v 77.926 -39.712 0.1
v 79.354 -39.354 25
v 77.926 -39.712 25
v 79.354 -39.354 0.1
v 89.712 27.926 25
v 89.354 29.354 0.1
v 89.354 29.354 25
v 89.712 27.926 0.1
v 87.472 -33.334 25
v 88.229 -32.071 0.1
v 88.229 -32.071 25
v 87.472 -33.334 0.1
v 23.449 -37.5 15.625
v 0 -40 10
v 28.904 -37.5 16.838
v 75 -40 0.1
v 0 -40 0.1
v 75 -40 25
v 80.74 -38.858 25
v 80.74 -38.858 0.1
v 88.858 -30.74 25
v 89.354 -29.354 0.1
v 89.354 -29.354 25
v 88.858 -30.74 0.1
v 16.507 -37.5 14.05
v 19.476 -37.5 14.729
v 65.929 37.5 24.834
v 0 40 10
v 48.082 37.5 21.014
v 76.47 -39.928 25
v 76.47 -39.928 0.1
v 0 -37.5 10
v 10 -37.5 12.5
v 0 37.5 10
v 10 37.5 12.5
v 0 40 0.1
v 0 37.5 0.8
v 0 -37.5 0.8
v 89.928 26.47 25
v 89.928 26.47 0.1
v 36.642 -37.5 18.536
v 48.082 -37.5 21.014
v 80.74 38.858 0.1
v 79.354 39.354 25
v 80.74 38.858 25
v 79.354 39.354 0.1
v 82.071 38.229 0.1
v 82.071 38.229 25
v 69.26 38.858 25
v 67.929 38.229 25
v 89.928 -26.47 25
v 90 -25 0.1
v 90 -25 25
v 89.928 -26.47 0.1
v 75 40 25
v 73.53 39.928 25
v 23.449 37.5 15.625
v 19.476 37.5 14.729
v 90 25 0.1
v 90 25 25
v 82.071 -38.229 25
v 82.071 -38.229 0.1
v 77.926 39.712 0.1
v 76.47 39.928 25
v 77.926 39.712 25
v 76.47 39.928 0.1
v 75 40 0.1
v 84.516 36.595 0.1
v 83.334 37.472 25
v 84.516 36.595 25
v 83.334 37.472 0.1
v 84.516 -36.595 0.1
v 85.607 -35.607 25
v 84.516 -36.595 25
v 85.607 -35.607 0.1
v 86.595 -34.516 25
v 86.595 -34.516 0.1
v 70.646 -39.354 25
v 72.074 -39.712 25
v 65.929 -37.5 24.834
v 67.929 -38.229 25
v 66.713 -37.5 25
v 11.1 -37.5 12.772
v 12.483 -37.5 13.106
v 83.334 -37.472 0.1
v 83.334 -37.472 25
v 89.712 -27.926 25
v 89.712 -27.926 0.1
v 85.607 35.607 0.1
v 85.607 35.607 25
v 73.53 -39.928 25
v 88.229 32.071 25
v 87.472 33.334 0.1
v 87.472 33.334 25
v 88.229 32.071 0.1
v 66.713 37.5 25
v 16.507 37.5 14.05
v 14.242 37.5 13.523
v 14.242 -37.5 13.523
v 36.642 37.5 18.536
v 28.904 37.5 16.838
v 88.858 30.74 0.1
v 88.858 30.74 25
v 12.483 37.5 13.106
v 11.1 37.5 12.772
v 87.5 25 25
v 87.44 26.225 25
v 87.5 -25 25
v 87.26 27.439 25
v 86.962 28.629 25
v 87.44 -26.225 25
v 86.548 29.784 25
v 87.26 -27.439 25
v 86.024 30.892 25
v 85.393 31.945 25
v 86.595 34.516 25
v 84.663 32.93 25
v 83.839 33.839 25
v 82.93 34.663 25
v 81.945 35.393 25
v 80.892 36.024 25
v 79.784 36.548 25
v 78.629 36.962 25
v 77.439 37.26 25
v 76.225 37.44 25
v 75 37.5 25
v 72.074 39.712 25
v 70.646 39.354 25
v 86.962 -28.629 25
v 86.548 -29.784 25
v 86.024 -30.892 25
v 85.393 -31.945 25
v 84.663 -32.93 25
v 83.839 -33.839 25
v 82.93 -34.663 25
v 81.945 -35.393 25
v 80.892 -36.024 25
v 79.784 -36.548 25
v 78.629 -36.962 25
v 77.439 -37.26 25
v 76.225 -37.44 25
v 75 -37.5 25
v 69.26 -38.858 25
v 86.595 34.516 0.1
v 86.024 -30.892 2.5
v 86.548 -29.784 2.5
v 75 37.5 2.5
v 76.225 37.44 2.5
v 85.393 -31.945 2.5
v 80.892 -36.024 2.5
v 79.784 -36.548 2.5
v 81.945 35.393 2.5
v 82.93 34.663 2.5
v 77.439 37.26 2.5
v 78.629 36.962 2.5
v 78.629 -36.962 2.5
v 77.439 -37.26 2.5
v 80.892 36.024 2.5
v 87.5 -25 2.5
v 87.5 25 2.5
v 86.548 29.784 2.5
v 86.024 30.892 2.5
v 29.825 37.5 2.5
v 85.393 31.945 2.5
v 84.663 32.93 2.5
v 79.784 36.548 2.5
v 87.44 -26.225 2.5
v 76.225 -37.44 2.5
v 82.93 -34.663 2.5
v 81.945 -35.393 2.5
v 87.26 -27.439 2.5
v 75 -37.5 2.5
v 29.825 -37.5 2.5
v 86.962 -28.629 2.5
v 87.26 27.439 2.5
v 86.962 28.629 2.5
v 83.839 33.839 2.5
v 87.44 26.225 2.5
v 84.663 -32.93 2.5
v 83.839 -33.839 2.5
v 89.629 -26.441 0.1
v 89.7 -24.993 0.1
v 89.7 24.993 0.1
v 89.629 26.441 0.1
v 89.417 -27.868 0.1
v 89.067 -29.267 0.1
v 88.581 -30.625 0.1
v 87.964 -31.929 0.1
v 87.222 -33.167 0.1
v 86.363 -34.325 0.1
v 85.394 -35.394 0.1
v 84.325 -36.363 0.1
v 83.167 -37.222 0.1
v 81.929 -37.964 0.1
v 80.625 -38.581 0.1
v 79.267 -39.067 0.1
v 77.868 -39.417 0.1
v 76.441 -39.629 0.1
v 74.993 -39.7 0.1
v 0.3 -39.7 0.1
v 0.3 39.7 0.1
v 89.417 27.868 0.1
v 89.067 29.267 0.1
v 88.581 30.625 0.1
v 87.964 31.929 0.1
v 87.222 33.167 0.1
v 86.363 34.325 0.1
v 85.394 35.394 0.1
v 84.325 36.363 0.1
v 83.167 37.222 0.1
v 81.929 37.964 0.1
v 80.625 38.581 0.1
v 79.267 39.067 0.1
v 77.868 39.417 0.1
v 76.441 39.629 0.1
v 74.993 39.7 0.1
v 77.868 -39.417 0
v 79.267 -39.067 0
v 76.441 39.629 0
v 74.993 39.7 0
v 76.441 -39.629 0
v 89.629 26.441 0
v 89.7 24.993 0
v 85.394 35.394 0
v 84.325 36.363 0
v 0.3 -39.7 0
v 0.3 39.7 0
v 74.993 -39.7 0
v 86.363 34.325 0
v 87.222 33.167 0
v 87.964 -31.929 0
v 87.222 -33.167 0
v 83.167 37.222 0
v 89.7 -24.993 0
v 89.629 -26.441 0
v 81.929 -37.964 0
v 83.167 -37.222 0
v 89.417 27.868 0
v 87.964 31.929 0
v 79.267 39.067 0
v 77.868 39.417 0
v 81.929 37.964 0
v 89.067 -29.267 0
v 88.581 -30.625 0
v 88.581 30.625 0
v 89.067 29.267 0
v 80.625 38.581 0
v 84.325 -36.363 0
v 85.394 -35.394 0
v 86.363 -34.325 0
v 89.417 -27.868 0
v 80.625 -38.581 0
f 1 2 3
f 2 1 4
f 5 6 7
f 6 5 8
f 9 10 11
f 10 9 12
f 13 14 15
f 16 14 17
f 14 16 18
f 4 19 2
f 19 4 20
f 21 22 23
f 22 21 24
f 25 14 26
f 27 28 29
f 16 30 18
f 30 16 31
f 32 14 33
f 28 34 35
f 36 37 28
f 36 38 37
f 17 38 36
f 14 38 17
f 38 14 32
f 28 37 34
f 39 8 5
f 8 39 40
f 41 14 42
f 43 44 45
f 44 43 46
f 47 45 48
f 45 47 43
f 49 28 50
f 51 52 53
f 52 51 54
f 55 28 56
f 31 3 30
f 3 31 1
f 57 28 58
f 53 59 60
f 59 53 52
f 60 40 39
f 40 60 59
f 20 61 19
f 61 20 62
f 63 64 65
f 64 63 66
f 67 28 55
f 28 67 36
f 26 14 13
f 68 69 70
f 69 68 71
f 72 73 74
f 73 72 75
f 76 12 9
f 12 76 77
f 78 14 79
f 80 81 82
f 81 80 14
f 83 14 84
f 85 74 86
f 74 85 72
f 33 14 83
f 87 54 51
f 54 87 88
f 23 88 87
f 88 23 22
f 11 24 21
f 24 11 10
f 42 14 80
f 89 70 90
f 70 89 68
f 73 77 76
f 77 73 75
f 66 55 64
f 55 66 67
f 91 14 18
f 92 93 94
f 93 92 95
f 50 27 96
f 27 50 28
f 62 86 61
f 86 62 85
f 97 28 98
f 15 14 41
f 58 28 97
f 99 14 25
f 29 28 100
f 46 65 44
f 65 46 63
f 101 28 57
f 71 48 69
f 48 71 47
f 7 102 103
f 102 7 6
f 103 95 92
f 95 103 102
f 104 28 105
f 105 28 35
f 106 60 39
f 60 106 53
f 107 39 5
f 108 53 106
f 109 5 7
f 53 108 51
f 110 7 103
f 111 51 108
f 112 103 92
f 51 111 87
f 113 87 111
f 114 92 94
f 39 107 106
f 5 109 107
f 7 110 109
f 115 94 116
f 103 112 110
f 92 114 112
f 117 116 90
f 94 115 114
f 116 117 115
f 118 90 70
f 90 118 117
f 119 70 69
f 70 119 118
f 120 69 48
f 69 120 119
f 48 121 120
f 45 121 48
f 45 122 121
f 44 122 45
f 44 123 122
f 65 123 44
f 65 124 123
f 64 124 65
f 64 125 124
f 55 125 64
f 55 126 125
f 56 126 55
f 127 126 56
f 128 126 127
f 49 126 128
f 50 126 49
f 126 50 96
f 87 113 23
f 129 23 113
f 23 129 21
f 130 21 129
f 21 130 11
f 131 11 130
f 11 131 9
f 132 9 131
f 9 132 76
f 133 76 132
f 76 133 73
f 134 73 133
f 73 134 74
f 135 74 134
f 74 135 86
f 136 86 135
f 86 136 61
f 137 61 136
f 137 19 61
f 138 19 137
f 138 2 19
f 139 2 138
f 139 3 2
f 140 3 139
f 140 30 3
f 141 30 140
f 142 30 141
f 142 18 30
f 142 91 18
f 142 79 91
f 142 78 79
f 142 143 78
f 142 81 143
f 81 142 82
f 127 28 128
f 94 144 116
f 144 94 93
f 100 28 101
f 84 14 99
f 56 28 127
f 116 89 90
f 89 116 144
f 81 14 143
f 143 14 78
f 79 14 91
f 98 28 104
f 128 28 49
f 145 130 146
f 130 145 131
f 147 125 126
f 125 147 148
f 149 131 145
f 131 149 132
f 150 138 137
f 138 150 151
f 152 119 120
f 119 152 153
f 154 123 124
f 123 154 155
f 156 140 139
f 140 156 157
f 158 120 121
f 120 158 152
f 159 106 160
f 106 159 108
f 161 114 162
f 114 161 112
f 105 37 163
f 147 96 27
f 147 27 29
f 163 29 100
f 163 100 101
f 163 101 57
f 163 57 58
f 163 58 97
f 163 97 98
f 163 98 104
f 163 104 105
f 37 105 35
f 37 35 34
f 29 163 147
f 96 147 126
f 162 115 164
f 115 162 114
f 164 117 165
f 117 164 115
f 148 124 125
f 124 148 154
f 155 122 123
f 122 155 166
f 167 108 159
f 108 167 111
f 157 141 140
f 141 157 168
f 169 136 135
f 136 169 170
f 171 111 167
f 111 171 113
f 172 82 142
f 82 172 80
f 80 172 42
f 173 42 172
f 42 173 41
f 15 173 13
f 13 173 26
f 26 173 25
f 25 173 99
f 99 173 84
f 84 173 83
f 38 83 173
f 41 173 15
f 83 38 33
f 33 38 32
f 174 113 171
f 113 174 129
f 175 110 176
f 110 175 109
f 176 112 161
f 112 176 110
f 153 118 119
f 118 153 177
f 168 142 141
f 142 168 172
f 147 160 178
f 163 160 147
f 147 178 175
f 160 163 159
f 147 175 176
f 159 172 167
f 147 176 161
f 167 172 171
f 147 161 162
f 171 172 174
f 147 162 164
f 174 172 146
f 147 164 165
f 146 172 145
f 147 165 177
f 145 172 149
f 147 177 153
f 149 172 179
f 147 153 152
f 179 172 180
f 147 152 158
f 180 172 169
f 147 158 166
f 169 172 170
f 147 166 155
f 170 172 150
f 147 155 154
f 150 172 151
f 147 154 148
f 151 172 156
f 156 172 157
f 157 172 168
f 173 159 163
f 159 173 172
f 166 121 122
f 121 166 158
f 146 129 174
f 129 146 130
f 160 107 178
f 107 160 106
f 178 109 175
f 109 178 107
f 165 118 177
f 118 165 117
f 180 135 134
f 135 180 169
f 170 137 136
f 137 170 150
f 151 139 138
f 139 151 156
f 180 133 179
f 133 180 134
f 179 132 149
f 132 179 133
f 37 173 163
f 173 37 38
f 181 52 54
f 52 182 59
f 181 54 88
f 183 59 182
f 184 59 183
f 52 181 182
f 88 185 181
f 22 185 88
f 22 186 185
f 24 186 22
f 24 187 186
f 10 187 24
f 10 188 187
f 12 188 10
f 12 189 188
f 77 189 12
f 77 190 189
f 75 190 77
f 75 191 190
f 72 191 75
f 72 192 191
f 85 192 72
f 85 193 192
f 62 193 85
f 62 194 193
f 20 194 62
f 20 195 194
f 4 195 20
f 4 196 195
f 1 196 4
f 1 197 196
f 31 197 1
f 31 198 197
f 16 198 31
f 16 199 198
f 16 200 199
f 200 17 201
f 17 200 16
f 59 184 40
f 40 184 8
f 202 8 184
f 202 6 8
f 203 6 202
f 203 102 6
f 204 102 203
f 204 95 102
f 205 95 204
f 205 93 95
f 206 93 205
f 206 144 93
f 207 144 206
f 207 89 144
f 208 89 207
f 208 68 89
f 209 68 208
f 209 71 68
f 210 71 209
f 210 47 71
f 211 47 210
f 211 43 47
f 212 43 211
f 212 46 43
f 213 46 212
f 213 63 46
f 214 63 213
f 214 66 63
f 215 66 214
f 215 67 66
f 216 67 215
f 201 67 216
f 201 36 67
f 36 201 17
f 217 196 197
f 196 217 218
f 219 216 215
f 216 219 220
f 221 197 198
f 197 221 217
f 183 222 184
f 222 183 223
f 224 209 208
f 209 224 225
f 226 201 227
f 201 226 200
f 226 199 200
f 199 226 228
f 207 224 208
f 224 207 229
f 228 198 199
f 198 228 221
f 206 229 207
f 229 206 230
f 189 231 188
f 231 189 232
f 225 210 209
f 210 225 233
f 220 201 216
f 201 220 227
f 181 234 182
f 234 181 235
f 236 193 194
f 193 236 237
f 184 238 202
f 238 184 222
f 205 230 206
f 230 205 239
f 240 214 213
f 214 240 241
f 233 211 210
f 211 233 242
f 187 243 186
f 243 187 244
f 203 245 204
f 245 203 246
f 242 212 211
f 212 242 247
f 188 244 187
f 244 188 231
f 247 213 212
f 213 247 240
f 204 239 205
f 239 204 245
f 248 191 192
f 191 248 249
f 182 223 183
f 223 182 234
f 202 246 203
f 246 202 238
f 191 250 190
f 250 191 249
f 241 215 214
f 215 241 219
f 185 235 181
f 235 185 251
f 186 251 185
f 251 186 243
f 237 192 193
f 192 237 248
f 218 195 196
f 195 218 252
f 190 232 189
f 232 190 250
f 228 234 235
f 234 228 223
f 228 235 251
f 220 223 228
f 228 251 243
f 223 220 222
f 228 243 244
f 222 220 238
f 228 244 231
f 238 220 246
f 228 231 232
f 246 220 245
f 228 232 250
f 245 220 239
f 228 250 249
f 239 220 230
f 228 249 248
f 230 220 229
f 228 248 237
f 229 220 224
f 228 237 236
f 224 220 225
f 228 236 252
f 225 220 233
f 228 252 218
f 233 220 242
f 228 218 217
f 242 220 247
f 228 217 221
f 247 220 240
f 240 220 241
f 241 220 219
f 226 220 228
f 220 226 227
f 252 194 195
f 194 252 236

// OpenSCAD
$fn=64;

// Width at the opening, includes wall thickness.
width = 80;
// Length including wall thickness.
length = 90;
// Wall height at the closed end
height = 25;
// Wall height at the open end.
front_height = 10;
// Radius of the two corners at the closed end.
corner_radius=15;
// Wall thickness
wall_thickness = 2.5;
// Base thickness
base_thickness = 2.5;
// Reduced base thickness at the open end.
slope_height = 0.8;
// Length of base slope at the open end.
slope_length = 30;
// Inset first layer by this dimension (0 to disable). Helps prevnting
// 'elephant foot' syndrom.
first_layer_inset_width = 0.3;
// Height of first layer. Ignored if first_layer_inset_width is zero or negative.
first_layer_inset_height = 0.2;

eps1 = 0.01 + 0;  // hide on thingiverse customizer.
eps2 = 2*eps1;

// Operator to inset first layer to eliminate elephant foot.
// Children are assumed to be on the z=0 plane.
module inset_first_layer(w=0.4, h=0.2, eps=0.01) {
  if (w == 0 || h < 0) {
    children();
  } else {
    difference() {
      children();  
      // TODO: use actual extended children projection instead
      // of a clube with arbitrary large x,y values.
      cube([200, 200, h], center=true);
    }
    linear_extrude(height=h+eps) 
      offset(r = -w) 
        projection(cut=true) 
          children();  
  }
}

module block() {
  hull() {
    translate([length-corner_radius, width/2-corner_radius, 0]) 
        cylinder(r=corner_radius, h=height);
    translate([length-corner_radius, -(width/2-corner_radius), 0]) 
        cylinder(r=corner_radius, h=height);
    
    translate([0, -width/2, 0]) cube([eps1, width, front_height]);
  }
}

module hollow() {
  w = width - 2*wall_thickness;
  l = length - wall_thickness;
  r = corner_radius - wall_thickness;
  
  hull() {
    translate([l-r, w/2-r, base_thickness]) 
        cylinder(r=r, h=height);
    translate([l-r, -(w/2-r), base_thickness]) 
        cylinder(r=r, h=height);
    translate([-eps1, -w/2, base_thickness]) cube([eps1, w, height]);
  }
}

module slope() {
  w = width - 2*wall_thickness;
  hull() {
    translate([-eps1, -w/2, slope_height]) 
        cube([eps1, w, height]);
    translate([slope_length-eps1, -w/2, base_thickness+eps1]) 
        cube([eps1, w, height]);
  }
}

module main() {
  inset_first_layer(first_layer_inset_width, first_layer_inset_height) {
    difference() {
      block();
      hollow();
      slope();
    }
  }
}

main();
